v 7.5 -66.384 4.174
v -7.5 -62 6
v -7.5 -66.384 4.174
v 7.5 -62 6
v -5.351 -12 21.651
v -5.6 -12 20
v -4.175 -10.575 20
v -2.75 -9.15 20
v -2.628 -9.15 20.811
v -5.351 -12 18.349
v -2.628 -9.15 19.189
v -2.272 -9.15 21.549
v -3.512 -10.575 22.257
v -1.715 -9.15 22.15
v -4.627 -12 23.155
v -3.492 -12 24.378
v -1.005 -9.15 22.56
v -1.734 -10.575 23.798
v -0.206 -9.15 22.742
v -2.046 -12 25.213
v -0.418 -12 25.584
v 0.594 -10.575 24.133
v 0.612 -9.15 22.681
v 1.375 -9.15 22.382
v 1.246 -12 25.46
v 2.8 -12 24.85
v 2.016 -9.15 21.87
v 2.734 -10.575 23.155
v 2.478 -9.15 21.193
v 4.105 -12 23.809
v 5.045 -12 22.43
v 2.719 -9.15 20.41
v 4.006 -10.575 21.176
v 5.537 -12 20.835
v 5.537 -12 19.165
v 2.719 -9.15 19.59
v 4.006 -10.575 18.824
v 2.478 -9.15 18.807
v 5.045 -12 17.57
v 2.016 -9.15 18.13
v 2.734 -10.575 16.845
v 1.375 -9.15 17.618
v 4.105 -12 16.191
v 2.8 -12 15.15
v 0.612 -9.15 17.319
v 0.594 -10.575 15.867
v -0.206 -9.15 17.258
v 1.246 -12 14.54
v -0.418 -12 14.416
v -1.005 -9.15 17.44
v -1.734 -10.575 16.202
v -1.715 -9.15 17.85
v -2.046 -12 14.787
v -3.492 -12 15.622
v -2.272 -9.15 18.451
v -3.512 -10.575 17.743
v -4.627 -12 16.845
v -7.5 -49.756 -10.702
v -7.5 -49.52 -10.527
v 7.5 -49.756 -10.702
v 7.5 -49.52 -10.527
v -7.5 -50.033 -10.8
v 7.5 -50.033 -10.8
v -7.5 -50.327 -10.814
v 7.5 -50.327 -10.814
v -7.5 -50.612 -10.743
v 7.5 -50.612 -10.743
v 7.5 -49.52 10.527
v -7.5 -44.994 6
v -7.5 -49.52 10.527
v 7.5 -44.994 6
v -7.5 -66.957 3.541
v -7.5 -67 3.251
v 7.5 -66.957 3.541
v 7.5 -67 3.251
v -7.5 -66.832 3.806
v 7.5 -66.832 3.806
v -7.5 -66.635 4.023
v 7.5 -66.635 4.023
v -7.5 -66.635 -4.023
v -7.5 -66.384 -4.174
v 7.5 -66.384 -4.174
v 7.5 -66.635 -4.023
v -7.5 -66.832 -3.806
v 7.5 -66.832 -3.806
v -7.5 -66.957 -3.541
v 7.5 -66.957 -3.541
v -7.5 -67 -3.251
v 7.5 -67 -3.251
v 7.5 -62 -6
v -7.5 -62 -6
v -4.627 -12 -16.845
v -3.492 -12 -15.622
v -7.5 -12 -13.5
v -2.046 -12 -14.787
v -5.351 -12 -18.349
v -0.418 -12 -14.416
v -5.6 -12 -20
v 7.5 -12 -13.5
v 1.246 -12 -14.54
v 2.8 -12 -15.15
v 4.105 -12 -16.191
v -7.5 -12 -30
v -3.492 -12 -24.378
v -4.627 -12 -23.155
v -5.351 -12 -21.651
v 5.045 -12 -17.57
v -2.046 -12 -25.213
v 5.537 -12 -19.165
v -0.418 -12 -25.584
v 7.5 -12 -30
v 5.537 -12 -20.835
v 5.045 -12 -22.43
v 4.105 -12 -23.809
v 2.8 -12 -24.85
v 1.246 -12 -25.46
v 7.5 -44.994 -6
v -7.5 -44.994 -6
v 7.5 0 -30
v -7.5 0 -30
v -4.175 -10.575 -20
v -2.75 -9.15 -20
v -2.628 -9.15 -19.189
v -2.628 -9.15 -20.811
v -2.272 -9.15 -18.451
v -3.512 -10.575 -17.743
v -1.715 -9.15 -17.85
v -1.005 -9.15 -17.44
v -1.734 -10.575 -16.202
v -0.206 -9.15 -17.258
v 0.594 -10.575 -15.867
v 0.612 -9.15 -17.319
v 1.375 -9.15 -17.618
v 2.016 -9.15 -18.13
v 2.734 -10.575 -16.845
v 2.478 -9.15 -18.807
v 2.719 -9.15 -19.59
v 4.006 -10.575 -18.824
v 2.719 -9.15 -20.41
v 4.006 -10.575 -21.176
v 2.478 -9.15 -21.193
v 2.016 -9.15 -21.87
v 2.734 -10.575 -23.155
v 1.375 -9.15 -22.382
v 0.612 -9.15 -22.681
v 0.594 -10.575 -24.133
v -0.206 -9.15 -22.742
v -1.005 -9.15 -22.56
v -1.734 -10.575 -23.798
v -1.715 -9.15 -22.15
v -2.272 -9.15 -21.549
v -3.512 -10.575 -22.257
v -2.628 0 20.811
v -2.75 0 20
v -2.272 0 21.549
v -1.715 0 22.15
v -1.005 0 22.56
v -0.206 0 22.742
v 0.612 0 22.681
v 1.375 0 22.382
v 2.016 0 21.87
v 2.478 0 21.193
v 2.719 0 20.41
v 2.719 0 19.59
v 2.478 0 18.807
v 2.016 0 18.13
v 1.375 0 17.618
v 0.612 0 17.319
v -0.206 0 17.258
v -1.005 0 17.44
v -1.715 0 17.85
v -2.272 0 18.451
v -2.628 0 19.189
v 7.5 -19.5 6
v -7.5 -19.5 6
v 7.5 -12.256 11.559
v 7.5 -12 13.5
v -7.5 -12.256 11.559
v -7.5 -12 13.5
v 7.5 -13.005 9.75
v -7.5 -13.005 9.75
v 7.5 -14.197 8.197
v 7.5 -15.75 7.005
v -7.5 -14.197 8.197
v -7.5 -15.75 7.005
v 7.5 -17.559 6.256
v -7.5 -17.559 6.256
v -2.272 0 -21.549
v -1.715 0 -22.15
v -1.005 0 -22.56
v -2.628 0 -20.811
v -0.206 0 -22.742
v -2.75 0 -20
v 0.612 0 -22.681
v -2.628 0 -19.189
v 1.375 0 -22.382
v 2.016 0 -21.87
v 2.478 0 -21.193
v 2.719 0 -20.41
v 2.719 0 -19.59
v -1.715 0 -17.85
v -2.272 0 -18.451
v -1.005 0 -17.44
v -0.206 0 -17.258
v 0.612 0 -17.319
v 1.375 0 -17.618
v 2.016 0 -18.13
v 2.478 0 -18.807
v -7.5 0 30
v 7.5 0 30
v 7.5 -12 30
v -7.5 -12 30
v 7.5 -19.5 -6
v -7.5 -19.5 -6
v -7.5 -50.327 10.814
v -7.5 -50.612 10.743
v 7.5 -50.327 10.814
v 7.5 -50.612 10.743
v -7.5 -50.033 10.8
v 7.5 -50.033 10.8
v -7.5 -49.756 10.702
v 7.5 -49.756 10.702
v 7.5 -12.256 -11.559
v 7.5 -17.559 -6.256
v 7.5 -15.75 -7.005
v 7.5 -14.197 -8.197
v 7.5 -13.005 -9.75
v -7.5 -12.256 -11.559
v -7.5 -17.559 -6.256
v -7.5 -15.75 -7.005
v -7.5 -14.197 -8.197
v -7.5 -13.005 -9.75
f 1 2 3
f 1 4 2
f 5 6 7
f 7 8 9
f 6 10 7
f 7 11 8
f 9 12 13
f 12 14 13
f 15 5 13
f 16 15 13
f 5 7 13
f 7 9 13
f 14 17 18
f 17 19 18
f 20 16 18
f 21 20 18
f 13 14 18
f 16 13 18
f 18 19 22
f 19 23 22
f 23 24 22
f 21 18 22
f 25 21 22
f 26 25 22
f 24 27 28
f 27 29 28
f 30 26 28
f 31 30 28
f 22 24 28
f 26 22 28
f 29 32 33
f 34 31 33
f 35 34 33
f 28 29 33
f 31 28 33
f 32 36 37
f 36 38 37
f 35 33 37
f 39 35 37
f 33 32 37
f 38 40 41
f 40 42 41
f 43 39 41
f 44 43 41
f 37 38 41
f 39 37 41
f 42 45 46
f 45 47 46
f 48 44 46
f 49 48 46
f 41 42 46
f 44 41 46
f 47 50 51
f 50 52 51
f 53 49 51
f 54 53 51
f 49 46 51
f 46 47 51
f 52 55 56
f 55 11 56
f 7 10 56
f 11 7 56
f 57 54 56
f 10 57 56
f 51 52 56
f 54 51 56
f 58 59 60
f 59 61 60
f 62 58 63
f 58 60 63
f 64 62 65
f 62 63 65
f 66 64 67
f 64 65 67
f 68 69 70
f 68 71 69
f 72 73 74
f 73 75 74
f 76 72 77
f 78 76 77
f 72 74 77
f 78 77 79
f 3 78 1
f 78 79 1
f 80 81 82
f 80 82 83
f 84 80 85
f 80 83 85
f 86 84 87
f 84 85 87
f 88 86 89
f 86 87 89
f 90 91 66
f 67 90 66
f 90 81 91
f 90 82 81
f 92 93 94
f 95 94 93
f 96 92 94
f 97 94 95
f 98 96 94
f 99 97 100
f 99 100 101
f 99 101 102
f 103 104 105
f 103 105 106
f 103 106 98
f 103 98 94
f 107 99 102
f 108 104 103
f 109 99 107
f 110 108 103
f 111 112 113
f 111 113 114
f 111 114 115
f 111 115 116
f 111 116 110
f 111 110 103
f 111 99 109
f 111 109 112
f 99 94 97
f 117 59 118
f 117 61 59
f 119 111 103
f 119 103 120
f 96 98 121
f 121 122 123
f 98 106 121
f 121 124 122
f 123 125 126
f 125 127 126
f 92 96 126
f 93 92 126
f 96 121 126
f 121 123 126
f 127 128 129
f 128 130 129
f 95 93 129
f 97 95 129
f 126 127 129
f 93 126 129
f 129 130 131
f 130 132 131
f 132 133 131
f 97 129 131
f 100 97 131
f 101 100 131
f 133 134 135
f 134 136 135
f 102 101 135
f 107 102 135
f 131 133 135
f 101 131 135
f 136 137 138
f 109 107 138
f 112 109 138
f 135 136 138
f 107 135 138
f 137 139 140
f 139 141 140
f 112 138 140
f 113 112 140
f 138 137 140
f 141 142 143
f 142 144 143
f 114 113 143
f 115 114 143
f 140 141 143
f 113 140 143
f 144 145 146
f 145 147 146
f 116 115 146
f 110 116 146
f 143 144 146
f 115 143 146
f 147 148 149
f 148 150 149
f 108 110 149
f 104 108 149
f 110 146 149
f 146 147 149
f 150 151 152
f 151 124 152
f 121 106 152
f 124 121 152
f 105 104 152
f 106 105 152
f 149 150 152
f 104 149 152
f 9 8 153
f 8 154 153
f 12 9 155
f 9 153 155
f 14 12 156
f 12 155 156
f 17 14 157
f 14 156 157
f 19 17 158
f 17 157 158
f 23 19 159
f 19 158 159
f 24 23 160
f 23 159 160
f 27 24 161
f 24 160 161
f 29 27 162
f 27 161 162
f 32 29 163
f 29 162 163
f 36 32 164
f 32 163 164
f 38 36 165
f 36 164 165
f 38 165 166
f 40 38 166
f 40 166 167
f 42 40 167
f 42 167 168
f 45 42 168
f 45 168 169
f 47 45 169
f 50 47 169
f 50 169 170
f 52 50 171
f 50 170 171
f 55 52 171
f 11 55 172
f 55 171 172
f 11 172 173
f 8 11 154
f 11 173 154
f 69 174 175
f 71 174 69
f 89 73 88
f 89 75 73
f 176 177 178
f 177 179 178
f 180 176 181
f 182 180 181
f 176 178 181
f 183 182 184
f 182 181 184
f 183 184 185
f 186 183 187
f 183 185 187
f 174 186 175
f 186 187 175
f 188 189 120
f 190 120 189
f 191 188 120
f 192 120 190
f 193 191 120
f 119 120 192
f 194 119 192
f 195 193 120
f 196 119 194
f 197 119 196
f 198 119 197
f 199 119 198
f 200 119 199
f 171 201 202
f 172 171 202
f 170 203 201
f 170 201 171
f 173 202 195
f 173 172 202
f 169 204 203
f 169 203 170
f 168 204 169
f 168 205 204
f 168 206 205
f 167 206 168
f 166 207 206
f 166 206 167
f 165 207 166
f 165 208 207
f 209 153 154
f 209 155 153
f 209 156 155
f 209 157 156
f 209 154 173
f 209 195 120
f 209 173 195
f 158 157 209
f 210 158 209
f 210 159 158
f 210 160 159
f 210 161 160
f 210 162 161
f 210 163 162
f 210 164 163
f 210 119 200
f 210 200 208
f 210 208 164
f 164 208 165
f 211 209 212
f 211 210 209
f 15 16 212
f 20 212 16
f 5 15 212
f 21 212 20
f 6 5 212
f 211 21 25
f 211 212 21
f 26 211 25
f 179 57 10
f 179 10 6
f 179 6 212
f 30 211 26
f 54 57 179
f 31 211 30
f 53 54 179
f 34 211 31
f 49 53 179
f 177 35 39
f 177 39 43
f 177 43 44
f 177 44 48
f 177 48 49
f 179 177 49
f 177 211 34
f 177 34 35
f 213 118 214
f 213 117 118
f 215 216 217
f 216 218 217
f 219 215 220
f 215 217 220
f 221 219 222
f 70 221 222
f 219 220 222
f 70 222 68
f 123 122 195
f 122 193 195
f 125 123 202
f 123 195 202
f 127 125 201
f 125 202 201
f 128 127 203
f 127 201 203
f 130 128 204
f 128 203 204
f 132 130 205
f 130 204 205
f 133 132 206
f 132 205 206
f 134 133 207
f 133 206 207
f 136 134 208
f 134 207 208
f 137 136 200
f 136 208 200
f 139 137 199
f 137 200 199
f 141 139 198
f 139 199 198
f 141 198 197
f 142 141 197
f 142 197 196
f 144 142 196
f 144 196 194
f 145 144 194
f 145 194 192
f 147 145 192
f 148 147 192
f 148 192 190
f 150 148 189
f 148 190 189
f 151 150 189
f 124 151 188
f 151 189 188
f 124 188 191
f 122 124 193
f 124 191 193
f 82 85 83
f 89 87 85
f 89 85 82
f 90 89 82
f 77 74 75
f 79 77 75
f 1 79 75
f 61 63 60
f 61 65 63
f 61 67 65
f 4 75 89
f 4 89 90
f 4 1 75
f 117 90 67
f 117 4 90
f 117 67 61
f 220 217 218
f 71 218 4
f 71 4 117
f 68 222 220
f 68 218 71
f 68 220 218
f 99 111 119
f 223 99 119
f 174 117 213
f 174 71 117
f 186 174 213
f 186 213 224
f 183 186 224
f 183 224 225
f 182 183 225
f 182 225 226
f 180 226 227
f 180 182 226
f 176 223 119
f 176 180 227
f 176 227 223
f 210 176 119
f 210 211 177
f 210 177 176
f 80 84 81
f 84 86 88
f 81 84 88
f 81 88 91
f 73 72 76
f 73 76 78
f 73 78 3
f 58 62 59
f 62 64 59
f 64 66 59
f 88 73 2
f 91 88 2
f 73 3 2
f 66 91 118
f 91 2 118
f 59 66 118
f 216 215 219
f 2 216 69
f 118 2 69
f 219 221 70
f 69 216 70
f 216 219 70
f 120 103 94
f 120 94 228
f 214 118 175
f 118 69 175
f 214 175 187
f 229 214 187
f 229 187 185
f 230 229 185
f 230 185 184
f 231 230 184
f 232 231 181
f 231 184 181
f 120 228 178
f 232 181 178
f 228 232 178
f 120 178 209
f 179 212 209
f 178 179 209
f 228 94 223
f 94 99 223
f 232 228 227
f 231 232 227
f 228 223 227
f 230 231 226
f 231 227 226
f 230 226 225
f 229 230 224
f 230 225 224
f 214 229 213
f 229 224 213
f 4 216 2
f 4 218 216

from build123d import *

# Parameters (mm, degrees)
F1_DEPTH       = 7.5
F2_R           = 1
F4_D           = 5.5
F4_CSINK_D     = 11.2
F4_CSINK_ANGLE = 90
F5_R           = 7.5


with BuildPart() as f1:
    # F0 (on Right) → F1 (new body, symmetric)
    with BuildSketch(Plane.YZ):
        Polygon((-67, 0), (-62, 0), (-62, 6), (-67, 3.917779892), align=None)
        Polygon((-62, 6), (-44.9935843937, 6), (-49.9935843937, 11), align=None)
        Polygon((-12, 0), (-12, 6), (-44.9935843937, 6), (-62, 6), (-62, 0), align=None)
        Polygon((-62, -6), (-62, 0), (-67, 0), (-67, -3.917779892), align=None)
        Polygon((-49.9935843937, -11), (-44.9935843937, -6), (-62, -6), align=None)
        Polygon((-12, -6), (-12, 0), (-62, 0), (-62, -6), (-44.9935843937, -6), align=None)
        Polygon((0, 0), (0, 30), (-12, 30), (-12, 6), (-12, 0), align=None)
        Polygon((0, -30), (0, 0), (-12, 0), (-12, -6), (-12, -30), align=None)
    extrude(amount=F1_DEPTH, both=True)

    # F2
    f2_edges = [f1.edges().sort_by_distance(p)[0] for p in [
        (0, -49.993584, 11),
        (0, -67, 3.91778),
        (0, -67, -3.91778),
        (0, -49.993584, -11),
    ]]
    fillet(f2_edges, radius=F2_R)

    # F4 (through all)
    with Locations(Plane.XZ.offset(12)):
        with Locations((0, 20), (0, -20)):
            CounterSinkHole(F4_D / 2, F4_CSINK_D / 2, counter_sink_angle=F4_CSINK_ANGLE)

    # F5
    f5_edges = [f1.edges().sort_by_distance(p)[0] for p in [
        (0, -12, 6),
        (0, -12, -6),
    ]]
    fillet(f5_edges, radius=F5_R)


solid = f1.part
